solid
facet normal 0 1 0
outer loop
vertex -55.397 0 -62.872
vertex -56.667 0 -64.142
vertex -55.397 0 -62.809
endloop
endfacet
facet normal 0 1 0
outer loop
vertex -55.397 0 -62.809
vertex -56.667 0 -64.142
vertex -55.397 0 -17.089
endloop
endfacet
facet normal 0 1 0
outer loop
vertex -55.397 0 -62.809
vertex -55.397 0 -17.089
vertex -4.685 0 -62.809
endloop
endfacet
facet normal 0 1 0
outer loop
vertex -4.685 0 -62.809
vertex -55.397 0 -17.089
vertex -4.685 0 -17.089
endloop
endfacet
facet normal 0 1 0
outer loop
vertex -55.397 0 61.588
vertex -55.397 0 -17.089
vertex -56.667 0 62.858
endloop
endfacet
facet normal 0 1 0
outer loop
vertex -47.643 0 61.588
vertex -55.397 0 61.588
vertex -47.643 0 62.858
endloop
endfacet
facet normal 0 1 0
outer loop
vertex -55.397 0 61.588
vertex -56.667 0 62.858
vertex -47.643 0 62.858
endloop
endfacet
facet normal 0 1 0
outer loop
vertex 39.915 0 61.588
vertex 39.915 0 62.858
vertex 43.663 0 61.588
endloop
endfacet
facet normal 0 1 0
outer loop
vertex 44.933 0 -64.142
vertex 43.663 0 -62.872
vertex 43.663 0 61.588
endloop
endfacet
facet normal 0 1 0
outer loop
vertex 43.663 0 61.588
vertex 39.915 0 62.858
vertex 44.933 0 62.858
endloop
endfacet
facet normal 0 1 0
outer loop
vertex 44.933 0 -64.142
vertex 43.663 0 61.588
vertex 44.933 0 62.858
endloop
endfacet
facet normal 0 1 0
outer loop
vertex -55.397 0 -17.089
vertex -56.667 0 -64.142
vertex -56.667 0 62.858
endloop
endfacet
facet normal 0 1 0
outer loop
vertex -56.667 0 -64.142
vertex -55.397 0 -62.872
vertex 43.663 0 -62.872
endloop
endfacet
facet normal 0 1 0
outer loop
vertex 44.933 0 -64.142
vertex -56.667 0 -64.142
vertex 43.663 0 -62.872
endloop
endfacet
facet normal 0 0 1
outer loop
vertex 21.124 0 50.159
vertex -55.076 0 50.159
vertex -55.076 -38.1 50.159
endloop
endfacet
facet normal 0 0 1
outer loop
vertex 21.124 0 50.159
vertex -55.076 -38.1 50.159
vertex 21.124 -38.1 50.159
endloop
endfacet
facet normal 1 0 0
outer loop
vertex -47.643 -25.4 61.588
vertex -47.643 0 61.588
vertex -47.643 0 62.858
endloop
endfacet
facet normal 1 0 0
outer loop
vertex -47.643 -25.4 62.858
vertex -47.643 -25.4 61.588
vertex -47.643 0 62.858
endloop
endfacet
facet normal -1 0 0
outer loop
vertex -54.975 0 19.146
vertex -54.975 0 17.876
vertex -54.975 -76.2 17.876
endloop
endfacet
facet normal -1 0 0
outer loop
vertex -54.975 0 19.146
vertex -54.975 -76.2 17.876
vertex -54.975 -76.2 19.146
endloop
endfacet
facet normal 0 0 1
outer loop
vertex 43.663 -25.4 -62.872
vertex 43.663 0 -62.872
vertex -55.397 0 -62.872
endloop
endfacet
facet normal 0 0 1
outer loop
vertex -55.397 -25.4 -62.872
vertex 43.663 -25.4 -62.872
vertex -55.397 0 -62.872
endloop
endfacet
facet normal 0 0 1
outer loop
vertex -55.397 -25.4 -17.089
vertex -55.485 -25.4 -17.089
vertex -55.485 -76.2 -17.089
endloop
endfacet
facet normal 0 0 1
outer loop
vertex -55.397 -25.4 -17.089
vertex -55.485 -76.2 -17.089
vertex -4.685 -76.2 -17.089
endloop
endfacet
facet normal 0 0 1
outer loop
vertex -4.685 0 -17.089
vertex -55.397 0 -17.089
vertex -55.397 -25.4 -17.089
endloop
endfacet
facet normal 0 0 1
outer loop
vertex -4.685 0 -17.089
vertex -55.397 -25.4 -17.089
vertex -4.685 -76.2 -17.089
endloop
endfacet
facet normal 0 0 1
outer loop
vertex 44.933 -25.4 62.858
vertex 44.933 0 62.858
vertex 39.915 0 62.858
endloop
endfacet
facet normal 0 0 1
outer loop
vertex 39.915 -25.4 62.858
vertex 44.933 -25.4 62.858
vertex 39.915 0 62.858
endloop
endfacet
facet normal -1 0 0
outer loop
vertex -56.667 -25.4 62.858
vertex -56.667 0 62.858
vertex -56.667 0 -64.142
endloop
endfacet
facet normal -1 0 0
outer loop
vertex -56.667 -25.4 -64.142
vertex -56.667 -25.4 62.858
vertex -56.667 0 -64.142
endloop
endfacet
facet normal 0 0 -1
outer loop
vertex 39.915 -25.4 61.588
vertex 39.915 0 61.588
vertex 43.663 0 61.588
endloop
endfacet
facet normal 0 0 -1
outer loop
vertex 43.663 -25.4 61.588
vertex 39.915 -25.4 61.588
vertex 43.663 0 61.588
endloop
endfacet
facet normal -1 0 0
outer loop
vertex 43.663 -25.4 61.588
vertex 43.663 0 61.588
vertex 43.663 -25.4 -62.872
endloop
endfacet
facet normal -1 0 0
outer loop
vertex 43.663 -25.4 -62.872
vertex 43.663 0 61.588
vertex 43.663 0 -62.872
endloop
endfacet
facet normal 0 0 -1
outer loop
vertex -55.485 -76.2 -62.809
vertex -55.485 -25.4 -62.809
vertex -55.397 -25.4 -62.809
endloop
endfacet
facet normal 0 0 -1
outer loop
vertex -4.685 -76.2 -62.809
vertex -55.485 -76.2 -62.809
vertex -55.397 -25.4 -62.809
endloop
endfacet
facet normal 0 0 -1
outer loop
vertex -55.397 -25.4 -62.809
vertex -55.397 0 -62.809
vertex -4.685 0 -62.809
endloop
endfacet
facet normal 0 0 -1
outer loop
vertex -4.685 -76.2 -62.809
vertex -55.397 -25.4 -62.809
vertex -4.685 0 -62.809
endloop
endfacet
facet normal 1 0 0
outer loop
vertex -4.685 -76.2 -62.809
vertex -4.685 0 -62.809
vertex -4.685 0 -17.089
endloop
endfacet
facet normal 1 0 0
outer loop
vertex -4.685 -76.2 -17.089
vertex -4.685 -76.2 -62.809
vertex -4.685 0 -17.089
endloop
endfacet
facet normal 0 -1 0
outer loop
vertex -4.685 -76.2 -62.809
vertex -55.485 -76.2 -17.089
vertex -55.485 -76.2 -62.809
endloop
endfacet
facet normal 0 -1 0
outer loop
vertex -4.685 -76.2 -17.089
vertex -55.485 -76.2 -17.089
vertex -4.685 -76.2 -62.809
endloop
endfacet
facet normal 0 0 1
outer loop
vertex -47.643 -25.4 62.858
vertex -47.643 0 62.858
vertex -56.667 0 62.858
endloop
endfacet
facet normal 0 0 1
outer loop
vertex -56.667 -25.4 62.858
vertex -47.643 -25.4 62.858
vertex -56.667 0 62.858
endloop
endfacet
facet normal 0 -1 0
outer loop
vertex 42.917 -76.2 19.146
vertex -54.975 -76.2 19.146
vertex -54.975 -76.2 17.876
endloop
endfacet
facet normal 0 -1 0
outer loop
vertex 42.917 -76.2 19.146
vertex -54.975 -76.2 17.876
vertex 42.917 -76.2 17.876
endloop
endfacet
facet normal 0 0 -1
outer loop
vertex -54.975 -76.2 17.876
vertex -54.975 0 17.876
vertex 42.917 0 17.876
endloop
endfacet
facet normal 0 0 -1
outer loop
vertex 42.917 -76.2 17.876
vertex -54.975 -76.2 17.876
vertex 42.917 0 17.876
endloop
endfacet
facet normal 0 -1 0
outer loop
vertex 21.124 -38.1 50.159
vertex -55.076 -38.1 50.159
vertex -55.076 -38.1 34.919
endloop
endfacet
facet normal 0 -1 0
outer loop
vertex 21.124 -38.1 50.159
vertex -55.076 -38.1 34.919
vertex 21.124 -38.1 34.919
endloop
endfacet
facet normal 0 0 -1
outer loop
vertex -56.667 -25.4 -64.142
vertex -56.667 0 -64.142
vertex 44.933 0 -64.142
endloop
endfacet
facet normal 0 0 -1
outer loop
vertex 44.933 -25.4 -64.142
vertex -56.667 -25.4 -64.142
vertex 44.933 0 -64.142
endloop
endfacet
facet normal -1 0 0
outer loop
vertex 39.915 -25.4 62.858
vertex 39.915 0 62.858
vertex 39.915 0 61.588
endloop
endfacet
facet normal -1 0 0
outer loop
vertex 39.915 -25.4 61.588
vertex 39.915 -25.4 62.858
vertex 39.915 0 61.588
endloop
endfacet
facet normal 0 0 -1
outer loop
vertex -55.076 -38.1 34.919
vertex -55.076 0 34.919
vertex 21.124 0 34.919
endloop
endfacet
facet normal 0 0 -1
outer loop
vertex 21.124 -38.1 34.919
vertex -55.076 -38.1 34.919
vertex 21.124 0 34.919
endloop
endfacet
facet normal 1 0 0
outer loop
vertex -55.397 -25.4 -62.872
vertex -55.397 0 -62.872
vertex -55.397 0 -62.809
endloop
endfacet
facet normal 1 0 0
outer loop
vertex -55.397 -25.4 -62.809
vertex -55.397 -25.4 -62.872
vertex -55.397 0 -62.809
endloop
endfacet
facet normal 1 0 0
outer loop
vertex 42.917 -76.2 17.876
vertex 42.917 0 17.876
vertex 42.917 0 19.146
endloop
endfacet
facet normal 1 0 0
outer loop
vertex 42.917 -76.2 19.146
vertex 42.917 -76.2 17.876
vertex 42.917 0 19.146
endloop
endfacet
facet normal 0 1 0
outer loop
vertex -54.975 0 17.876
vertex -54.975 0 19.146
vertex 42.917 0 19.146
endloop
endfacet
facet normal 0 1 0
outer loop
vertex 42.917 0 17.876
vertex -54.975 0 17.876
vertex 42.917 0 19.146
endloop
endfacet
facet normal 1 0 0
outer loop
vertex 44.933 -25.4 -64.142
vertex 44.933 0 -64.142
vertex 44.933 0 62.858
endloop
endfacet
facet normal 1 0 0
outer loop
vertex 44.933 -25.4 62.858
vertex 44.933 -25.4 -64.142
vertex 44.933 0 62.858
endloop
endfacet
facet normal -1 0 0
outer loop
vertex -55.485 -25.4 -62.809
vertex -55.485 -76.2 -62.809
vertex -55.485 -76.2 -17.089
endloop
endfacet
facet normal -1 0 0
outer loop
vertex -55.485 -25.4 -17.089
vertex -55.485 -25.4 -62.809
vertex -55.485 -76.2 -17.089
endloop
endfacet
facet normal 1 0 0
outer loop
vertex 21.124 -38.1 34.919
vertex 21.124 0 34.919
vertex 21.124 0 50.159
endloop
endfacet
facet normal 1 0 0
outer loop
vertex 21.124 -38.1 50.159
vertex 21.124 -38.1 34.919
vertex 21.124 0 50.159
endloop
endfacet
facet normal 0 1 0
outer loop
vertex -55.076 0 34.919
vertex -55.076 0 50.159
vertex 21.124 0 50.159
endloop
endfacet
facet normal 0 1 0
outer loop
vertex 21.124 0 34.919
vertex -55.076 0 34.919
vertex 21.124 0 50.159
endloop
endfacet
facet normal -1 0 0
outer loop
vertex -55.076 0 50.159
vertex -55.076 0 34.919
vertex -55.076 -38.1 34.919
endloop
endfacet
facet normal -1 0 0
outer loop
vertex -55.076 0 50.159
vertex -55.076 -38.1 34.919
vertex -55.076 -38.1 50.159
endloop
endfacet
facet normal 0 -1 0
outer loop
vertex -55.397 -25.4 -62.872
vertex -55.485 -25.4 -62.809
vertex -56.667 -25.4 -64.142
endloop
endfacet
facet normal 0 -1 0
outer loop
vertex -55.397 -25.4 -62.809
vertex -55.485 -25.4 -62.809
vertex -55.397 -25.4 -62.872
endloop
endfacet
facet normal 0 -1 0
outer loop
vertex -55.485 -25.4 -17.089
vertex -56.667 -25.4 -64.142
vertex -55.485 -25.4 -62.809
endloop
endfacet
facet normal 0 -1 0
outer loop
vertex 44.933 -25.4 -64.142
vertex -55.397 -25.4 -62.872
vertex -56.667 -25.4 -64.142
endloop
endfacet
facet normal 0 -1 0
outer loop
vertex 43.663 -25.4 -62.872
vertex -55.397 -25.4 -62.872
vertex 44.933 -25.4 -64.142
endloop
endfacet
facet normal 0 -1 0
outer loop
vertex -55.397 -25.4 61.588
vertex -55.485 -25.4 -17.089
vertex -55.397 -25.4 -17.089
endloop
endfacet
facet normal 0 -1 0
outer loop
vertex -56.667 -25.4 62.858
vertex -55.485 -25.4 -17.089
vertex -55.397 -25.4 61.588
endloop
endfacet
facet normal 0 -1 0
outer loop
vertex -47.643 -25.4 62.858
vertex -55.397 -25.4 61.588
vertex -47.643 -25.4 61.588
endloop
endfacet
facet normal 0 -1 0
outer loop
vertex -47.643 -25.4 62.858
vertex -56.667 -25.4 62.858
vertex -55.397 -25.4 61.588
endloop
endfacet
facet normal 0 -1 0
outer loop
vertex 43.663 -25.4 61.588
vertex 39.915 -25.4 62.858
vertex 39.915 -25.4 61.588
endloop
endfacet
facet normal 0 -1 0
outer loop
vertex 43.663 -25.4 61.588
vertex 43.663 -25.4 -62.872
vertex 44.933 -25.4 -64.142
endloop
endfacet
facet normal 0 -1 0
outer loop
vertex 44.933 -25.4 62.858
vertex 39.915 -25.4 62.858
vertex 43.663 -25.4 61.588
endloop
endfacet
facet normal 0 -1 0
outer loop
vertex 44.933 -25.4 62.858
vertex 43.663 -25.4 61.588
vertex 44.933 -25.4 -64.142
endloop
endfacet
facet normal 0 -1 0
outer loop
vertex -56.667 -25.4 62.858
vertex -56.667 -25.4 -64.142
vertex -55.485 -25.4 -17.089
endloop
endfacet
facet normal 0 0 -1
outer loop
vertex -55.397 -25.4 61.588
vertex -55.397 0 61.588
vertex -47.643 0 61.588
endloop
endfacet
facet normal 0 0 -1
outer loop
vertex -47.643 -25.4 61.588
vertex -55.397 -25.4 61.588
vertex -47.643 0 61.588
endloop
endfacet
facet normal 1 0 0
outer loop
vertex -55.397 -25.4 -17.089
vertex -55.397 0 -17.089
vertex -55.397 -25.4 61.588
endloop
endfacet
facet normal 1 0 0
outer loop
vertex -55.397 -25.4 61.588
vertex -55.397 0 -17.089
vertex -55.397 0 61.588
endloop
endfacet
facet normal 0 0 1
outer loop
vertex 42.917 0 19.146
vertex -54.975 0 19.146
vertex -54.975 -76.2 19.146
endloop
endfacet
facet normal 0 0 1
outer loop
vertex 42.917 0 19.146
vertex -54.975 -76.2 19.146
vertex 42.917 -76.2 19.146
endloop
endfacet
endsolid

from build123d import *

# Parameters (mm, degrees)
F2_DEPTH = 25.4
F1_W     = 50.8
F1_H     = 45.72
F3_DEPTH = 76.2
F4_W     = 97.8916
F4_H     = 1.27
F5_DEPTH = 76.2
F6_W     = 76.2
F6_H     = 15.24
F7_DEPTH = 38.1


with BuildPart() as f2:
    # F0 (on Front) → F2 (new body)
    with BuildSketch(Plane.XZ):
        Polygon((-47.642849, 62.858369), (-56.667452, 62.858369), (-56.667452, -64.141631), (44.932548, -64.141631), (44.932548, 62.858369), (39.915446, 62.858369), (39.915446, 61.588369), (43.662548, 61.588369), (43.662548, -62.871631), (-55.397452, -62.871631), (-55.397452, 61.588369), (-47.642849, 61.588369), align=None)
    extrude(amount=F2_DEPTH)

    # F1 (on Front) → F3 (join)
    with BuildSketch(Plane.XZ):
        with Locations((-30.085323, -39.94899)):
            Rectangle(F1_W, F1_H)
    extrude(amount=F3_DEPTH)


with BuildPart() as f5:
    # F4 (on Front) → F5 (new body)
    with BuildSketch(Plane.XZ):
        with Locations((-6.028768, 18.510638)):
            Rectangle(F4_W, F4_H)
    extrude(amount=F5_DEPTH)


with BuildPart() as f7:
    # F6 (on Front) → F7 (new body)
    with BuildSketch(Plane.XZ):
        with Locations((-16.976223, 42.53913)):
            Rectangle(F6_W, F6_H)
    extrude(amount=F7_DEPTH)


solid = Compound([f2.part, f5.part, f7.part])
